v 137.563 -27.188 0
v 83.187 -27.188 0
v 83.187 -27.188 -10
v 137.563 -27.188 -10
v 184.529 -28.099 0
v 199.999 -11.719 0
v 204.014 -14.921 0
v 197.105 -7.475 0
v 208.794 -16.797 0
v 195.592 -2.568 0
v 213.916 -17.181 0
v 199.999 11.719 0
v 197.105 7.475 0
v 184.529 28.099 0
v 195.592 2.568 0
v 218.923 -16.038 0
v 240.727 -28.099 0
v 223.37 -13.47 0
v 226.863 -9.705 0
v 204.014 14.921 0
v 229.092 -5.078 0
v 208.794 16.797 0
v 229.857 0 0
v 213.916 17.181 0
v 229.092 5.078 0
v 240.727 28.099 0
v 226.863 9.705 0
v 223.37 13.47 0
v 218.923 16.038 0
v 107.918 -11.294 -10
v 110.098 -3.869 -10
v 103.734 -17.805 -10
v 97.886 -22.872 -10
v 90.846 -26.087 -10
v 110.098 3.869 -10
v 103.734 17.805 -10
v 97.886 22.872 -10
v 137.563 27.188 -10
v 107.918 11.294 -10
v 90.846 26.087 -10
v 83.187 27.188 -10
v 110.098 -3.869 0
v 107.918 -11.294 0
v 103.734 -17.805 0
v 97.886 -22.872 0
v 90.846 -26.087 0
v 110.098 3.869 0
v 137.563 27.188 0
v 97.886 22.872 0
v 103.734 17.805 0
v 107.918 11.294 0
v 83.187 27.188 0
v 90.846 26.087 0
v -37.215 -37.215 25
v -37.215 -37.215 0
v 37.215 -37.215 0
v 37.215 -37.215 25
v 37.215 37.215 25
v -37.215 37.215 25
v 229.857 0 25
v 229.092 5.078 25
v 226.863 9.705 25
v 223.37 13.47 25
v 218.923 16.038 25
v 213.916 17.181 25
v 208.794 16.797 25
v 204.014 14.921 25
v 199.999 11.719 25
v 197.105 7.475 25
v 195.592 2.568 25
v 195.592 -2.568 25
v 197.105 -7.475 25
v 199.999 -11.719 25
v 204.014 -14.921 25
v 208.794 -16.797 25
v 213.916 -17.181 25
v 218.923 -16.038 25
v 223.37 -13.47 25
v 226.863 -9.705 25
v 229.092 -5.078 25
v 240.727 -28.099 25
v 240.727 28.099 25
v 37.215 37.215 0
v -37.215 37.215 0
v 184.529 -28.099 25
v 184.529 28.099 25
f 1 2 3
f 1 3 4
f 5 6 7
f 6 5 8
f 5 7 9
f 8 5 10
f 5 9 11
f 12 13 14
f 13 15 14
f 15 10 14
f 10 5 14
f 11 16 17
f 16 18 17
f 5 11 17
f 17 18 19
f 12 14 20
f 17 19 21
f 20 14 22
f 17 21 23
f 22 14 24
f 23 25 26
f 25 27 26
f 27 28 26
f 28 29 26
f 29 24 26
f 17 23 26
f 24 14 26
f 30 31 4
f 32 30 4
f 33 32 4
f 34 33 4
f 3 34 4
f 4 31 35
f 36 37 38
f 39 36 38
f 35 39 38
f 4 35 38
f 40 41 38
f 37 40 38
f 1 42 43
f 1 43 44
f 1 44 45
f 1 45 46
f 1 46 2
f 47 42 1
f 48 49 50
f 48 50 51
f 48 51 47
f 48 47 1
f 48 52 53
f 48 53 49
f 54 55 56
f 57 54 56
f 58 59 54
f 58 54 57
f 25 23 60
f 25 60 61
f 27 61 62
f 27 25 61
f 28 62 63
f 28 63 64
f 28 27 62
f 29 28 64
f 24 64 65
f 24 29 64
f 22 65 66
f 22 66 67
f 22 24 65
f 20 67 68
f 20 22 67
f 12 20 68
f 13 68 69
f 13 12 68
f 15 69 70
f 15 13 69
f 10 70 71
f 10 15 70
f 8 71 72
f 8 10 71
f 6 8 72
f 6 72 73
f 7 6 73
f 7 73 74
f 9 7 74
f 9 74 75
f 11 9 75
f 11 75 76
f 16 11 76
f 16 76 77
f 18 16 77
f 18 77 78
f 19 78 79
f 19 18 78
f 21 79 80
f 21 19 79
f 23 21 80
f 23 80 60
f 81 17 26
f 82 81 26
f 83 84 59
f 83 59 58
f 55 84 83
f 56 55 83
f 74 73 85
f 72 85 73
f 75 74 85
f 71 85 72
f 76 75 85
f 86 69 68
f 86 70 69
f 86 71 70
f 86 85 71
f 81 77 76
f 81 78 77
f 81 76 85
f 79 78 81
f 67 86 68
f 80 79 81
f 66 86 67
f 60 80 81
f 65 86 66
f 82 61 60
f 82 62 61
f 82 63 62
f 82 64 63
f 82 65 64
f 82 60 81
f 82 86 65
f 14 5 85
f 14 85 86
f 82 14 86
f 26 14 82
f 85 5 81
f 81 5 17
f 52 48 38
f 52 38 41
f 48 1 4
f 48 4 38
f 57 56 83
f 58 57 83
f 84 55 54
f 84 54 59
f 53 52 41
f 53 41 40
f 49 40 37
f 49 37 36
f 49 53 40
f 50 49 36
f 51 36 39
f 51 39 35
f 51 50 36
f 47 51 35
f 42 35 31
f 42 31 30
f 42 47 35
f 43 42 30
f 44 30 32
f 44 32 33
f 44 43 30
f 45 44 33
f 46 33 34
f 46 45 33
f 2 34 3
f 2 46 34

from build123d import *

# Parameters (mm, degrees)
F0_W     = 74.430912
F0_H     = 74.430912
F1_DEPTH = 25
F3_DEPTH = 10
F4_W     = 56.198493
F4_H     = 56.198492
F4_R     = 17.228945
F5_DEPTH = 25


with BuildPart() as f1:
    # F0 (on Top) → F1 (new body)
    with BuildSketch(Plane.XY):
        Rectangle(F0_W, F0_H)
    extrude(amount=F1_DEPTH)


with BuildPart() as f3:
    # F2 (on Top) → F3 (new body)
    with BuildSketch(Plane.XY):
        with BuildLine():
            Line((137.563335, 27.188392), (83.18655, 27.188392))
            ThreePointArc((83.18655, 27.188392), (110.374942, 0), (83.18655, -27.188392))
            Line((83.18655, -27.188392), (137.563335, -27.188392))
            Line((137.563335, -27.188392), (137.563335, 27.188392))
        make_face()
    extrude(amount=-F3_DEPTH)


with BuildPart() as f5:
    # F4 (on Top) → F5 (new body)
    with BuildSketch(Plane.XY):
        with Locations((212.62823, 0)):
            Rectangle(F4_W, F4_H)
        with Locations((212.62823, 0)):
            Circle(F4_R, mode=Mode.SUBTRACT)
    extrude(amount=F5_DEPTH)


solid = Compound([f1.part, f3.part, f5.part])
